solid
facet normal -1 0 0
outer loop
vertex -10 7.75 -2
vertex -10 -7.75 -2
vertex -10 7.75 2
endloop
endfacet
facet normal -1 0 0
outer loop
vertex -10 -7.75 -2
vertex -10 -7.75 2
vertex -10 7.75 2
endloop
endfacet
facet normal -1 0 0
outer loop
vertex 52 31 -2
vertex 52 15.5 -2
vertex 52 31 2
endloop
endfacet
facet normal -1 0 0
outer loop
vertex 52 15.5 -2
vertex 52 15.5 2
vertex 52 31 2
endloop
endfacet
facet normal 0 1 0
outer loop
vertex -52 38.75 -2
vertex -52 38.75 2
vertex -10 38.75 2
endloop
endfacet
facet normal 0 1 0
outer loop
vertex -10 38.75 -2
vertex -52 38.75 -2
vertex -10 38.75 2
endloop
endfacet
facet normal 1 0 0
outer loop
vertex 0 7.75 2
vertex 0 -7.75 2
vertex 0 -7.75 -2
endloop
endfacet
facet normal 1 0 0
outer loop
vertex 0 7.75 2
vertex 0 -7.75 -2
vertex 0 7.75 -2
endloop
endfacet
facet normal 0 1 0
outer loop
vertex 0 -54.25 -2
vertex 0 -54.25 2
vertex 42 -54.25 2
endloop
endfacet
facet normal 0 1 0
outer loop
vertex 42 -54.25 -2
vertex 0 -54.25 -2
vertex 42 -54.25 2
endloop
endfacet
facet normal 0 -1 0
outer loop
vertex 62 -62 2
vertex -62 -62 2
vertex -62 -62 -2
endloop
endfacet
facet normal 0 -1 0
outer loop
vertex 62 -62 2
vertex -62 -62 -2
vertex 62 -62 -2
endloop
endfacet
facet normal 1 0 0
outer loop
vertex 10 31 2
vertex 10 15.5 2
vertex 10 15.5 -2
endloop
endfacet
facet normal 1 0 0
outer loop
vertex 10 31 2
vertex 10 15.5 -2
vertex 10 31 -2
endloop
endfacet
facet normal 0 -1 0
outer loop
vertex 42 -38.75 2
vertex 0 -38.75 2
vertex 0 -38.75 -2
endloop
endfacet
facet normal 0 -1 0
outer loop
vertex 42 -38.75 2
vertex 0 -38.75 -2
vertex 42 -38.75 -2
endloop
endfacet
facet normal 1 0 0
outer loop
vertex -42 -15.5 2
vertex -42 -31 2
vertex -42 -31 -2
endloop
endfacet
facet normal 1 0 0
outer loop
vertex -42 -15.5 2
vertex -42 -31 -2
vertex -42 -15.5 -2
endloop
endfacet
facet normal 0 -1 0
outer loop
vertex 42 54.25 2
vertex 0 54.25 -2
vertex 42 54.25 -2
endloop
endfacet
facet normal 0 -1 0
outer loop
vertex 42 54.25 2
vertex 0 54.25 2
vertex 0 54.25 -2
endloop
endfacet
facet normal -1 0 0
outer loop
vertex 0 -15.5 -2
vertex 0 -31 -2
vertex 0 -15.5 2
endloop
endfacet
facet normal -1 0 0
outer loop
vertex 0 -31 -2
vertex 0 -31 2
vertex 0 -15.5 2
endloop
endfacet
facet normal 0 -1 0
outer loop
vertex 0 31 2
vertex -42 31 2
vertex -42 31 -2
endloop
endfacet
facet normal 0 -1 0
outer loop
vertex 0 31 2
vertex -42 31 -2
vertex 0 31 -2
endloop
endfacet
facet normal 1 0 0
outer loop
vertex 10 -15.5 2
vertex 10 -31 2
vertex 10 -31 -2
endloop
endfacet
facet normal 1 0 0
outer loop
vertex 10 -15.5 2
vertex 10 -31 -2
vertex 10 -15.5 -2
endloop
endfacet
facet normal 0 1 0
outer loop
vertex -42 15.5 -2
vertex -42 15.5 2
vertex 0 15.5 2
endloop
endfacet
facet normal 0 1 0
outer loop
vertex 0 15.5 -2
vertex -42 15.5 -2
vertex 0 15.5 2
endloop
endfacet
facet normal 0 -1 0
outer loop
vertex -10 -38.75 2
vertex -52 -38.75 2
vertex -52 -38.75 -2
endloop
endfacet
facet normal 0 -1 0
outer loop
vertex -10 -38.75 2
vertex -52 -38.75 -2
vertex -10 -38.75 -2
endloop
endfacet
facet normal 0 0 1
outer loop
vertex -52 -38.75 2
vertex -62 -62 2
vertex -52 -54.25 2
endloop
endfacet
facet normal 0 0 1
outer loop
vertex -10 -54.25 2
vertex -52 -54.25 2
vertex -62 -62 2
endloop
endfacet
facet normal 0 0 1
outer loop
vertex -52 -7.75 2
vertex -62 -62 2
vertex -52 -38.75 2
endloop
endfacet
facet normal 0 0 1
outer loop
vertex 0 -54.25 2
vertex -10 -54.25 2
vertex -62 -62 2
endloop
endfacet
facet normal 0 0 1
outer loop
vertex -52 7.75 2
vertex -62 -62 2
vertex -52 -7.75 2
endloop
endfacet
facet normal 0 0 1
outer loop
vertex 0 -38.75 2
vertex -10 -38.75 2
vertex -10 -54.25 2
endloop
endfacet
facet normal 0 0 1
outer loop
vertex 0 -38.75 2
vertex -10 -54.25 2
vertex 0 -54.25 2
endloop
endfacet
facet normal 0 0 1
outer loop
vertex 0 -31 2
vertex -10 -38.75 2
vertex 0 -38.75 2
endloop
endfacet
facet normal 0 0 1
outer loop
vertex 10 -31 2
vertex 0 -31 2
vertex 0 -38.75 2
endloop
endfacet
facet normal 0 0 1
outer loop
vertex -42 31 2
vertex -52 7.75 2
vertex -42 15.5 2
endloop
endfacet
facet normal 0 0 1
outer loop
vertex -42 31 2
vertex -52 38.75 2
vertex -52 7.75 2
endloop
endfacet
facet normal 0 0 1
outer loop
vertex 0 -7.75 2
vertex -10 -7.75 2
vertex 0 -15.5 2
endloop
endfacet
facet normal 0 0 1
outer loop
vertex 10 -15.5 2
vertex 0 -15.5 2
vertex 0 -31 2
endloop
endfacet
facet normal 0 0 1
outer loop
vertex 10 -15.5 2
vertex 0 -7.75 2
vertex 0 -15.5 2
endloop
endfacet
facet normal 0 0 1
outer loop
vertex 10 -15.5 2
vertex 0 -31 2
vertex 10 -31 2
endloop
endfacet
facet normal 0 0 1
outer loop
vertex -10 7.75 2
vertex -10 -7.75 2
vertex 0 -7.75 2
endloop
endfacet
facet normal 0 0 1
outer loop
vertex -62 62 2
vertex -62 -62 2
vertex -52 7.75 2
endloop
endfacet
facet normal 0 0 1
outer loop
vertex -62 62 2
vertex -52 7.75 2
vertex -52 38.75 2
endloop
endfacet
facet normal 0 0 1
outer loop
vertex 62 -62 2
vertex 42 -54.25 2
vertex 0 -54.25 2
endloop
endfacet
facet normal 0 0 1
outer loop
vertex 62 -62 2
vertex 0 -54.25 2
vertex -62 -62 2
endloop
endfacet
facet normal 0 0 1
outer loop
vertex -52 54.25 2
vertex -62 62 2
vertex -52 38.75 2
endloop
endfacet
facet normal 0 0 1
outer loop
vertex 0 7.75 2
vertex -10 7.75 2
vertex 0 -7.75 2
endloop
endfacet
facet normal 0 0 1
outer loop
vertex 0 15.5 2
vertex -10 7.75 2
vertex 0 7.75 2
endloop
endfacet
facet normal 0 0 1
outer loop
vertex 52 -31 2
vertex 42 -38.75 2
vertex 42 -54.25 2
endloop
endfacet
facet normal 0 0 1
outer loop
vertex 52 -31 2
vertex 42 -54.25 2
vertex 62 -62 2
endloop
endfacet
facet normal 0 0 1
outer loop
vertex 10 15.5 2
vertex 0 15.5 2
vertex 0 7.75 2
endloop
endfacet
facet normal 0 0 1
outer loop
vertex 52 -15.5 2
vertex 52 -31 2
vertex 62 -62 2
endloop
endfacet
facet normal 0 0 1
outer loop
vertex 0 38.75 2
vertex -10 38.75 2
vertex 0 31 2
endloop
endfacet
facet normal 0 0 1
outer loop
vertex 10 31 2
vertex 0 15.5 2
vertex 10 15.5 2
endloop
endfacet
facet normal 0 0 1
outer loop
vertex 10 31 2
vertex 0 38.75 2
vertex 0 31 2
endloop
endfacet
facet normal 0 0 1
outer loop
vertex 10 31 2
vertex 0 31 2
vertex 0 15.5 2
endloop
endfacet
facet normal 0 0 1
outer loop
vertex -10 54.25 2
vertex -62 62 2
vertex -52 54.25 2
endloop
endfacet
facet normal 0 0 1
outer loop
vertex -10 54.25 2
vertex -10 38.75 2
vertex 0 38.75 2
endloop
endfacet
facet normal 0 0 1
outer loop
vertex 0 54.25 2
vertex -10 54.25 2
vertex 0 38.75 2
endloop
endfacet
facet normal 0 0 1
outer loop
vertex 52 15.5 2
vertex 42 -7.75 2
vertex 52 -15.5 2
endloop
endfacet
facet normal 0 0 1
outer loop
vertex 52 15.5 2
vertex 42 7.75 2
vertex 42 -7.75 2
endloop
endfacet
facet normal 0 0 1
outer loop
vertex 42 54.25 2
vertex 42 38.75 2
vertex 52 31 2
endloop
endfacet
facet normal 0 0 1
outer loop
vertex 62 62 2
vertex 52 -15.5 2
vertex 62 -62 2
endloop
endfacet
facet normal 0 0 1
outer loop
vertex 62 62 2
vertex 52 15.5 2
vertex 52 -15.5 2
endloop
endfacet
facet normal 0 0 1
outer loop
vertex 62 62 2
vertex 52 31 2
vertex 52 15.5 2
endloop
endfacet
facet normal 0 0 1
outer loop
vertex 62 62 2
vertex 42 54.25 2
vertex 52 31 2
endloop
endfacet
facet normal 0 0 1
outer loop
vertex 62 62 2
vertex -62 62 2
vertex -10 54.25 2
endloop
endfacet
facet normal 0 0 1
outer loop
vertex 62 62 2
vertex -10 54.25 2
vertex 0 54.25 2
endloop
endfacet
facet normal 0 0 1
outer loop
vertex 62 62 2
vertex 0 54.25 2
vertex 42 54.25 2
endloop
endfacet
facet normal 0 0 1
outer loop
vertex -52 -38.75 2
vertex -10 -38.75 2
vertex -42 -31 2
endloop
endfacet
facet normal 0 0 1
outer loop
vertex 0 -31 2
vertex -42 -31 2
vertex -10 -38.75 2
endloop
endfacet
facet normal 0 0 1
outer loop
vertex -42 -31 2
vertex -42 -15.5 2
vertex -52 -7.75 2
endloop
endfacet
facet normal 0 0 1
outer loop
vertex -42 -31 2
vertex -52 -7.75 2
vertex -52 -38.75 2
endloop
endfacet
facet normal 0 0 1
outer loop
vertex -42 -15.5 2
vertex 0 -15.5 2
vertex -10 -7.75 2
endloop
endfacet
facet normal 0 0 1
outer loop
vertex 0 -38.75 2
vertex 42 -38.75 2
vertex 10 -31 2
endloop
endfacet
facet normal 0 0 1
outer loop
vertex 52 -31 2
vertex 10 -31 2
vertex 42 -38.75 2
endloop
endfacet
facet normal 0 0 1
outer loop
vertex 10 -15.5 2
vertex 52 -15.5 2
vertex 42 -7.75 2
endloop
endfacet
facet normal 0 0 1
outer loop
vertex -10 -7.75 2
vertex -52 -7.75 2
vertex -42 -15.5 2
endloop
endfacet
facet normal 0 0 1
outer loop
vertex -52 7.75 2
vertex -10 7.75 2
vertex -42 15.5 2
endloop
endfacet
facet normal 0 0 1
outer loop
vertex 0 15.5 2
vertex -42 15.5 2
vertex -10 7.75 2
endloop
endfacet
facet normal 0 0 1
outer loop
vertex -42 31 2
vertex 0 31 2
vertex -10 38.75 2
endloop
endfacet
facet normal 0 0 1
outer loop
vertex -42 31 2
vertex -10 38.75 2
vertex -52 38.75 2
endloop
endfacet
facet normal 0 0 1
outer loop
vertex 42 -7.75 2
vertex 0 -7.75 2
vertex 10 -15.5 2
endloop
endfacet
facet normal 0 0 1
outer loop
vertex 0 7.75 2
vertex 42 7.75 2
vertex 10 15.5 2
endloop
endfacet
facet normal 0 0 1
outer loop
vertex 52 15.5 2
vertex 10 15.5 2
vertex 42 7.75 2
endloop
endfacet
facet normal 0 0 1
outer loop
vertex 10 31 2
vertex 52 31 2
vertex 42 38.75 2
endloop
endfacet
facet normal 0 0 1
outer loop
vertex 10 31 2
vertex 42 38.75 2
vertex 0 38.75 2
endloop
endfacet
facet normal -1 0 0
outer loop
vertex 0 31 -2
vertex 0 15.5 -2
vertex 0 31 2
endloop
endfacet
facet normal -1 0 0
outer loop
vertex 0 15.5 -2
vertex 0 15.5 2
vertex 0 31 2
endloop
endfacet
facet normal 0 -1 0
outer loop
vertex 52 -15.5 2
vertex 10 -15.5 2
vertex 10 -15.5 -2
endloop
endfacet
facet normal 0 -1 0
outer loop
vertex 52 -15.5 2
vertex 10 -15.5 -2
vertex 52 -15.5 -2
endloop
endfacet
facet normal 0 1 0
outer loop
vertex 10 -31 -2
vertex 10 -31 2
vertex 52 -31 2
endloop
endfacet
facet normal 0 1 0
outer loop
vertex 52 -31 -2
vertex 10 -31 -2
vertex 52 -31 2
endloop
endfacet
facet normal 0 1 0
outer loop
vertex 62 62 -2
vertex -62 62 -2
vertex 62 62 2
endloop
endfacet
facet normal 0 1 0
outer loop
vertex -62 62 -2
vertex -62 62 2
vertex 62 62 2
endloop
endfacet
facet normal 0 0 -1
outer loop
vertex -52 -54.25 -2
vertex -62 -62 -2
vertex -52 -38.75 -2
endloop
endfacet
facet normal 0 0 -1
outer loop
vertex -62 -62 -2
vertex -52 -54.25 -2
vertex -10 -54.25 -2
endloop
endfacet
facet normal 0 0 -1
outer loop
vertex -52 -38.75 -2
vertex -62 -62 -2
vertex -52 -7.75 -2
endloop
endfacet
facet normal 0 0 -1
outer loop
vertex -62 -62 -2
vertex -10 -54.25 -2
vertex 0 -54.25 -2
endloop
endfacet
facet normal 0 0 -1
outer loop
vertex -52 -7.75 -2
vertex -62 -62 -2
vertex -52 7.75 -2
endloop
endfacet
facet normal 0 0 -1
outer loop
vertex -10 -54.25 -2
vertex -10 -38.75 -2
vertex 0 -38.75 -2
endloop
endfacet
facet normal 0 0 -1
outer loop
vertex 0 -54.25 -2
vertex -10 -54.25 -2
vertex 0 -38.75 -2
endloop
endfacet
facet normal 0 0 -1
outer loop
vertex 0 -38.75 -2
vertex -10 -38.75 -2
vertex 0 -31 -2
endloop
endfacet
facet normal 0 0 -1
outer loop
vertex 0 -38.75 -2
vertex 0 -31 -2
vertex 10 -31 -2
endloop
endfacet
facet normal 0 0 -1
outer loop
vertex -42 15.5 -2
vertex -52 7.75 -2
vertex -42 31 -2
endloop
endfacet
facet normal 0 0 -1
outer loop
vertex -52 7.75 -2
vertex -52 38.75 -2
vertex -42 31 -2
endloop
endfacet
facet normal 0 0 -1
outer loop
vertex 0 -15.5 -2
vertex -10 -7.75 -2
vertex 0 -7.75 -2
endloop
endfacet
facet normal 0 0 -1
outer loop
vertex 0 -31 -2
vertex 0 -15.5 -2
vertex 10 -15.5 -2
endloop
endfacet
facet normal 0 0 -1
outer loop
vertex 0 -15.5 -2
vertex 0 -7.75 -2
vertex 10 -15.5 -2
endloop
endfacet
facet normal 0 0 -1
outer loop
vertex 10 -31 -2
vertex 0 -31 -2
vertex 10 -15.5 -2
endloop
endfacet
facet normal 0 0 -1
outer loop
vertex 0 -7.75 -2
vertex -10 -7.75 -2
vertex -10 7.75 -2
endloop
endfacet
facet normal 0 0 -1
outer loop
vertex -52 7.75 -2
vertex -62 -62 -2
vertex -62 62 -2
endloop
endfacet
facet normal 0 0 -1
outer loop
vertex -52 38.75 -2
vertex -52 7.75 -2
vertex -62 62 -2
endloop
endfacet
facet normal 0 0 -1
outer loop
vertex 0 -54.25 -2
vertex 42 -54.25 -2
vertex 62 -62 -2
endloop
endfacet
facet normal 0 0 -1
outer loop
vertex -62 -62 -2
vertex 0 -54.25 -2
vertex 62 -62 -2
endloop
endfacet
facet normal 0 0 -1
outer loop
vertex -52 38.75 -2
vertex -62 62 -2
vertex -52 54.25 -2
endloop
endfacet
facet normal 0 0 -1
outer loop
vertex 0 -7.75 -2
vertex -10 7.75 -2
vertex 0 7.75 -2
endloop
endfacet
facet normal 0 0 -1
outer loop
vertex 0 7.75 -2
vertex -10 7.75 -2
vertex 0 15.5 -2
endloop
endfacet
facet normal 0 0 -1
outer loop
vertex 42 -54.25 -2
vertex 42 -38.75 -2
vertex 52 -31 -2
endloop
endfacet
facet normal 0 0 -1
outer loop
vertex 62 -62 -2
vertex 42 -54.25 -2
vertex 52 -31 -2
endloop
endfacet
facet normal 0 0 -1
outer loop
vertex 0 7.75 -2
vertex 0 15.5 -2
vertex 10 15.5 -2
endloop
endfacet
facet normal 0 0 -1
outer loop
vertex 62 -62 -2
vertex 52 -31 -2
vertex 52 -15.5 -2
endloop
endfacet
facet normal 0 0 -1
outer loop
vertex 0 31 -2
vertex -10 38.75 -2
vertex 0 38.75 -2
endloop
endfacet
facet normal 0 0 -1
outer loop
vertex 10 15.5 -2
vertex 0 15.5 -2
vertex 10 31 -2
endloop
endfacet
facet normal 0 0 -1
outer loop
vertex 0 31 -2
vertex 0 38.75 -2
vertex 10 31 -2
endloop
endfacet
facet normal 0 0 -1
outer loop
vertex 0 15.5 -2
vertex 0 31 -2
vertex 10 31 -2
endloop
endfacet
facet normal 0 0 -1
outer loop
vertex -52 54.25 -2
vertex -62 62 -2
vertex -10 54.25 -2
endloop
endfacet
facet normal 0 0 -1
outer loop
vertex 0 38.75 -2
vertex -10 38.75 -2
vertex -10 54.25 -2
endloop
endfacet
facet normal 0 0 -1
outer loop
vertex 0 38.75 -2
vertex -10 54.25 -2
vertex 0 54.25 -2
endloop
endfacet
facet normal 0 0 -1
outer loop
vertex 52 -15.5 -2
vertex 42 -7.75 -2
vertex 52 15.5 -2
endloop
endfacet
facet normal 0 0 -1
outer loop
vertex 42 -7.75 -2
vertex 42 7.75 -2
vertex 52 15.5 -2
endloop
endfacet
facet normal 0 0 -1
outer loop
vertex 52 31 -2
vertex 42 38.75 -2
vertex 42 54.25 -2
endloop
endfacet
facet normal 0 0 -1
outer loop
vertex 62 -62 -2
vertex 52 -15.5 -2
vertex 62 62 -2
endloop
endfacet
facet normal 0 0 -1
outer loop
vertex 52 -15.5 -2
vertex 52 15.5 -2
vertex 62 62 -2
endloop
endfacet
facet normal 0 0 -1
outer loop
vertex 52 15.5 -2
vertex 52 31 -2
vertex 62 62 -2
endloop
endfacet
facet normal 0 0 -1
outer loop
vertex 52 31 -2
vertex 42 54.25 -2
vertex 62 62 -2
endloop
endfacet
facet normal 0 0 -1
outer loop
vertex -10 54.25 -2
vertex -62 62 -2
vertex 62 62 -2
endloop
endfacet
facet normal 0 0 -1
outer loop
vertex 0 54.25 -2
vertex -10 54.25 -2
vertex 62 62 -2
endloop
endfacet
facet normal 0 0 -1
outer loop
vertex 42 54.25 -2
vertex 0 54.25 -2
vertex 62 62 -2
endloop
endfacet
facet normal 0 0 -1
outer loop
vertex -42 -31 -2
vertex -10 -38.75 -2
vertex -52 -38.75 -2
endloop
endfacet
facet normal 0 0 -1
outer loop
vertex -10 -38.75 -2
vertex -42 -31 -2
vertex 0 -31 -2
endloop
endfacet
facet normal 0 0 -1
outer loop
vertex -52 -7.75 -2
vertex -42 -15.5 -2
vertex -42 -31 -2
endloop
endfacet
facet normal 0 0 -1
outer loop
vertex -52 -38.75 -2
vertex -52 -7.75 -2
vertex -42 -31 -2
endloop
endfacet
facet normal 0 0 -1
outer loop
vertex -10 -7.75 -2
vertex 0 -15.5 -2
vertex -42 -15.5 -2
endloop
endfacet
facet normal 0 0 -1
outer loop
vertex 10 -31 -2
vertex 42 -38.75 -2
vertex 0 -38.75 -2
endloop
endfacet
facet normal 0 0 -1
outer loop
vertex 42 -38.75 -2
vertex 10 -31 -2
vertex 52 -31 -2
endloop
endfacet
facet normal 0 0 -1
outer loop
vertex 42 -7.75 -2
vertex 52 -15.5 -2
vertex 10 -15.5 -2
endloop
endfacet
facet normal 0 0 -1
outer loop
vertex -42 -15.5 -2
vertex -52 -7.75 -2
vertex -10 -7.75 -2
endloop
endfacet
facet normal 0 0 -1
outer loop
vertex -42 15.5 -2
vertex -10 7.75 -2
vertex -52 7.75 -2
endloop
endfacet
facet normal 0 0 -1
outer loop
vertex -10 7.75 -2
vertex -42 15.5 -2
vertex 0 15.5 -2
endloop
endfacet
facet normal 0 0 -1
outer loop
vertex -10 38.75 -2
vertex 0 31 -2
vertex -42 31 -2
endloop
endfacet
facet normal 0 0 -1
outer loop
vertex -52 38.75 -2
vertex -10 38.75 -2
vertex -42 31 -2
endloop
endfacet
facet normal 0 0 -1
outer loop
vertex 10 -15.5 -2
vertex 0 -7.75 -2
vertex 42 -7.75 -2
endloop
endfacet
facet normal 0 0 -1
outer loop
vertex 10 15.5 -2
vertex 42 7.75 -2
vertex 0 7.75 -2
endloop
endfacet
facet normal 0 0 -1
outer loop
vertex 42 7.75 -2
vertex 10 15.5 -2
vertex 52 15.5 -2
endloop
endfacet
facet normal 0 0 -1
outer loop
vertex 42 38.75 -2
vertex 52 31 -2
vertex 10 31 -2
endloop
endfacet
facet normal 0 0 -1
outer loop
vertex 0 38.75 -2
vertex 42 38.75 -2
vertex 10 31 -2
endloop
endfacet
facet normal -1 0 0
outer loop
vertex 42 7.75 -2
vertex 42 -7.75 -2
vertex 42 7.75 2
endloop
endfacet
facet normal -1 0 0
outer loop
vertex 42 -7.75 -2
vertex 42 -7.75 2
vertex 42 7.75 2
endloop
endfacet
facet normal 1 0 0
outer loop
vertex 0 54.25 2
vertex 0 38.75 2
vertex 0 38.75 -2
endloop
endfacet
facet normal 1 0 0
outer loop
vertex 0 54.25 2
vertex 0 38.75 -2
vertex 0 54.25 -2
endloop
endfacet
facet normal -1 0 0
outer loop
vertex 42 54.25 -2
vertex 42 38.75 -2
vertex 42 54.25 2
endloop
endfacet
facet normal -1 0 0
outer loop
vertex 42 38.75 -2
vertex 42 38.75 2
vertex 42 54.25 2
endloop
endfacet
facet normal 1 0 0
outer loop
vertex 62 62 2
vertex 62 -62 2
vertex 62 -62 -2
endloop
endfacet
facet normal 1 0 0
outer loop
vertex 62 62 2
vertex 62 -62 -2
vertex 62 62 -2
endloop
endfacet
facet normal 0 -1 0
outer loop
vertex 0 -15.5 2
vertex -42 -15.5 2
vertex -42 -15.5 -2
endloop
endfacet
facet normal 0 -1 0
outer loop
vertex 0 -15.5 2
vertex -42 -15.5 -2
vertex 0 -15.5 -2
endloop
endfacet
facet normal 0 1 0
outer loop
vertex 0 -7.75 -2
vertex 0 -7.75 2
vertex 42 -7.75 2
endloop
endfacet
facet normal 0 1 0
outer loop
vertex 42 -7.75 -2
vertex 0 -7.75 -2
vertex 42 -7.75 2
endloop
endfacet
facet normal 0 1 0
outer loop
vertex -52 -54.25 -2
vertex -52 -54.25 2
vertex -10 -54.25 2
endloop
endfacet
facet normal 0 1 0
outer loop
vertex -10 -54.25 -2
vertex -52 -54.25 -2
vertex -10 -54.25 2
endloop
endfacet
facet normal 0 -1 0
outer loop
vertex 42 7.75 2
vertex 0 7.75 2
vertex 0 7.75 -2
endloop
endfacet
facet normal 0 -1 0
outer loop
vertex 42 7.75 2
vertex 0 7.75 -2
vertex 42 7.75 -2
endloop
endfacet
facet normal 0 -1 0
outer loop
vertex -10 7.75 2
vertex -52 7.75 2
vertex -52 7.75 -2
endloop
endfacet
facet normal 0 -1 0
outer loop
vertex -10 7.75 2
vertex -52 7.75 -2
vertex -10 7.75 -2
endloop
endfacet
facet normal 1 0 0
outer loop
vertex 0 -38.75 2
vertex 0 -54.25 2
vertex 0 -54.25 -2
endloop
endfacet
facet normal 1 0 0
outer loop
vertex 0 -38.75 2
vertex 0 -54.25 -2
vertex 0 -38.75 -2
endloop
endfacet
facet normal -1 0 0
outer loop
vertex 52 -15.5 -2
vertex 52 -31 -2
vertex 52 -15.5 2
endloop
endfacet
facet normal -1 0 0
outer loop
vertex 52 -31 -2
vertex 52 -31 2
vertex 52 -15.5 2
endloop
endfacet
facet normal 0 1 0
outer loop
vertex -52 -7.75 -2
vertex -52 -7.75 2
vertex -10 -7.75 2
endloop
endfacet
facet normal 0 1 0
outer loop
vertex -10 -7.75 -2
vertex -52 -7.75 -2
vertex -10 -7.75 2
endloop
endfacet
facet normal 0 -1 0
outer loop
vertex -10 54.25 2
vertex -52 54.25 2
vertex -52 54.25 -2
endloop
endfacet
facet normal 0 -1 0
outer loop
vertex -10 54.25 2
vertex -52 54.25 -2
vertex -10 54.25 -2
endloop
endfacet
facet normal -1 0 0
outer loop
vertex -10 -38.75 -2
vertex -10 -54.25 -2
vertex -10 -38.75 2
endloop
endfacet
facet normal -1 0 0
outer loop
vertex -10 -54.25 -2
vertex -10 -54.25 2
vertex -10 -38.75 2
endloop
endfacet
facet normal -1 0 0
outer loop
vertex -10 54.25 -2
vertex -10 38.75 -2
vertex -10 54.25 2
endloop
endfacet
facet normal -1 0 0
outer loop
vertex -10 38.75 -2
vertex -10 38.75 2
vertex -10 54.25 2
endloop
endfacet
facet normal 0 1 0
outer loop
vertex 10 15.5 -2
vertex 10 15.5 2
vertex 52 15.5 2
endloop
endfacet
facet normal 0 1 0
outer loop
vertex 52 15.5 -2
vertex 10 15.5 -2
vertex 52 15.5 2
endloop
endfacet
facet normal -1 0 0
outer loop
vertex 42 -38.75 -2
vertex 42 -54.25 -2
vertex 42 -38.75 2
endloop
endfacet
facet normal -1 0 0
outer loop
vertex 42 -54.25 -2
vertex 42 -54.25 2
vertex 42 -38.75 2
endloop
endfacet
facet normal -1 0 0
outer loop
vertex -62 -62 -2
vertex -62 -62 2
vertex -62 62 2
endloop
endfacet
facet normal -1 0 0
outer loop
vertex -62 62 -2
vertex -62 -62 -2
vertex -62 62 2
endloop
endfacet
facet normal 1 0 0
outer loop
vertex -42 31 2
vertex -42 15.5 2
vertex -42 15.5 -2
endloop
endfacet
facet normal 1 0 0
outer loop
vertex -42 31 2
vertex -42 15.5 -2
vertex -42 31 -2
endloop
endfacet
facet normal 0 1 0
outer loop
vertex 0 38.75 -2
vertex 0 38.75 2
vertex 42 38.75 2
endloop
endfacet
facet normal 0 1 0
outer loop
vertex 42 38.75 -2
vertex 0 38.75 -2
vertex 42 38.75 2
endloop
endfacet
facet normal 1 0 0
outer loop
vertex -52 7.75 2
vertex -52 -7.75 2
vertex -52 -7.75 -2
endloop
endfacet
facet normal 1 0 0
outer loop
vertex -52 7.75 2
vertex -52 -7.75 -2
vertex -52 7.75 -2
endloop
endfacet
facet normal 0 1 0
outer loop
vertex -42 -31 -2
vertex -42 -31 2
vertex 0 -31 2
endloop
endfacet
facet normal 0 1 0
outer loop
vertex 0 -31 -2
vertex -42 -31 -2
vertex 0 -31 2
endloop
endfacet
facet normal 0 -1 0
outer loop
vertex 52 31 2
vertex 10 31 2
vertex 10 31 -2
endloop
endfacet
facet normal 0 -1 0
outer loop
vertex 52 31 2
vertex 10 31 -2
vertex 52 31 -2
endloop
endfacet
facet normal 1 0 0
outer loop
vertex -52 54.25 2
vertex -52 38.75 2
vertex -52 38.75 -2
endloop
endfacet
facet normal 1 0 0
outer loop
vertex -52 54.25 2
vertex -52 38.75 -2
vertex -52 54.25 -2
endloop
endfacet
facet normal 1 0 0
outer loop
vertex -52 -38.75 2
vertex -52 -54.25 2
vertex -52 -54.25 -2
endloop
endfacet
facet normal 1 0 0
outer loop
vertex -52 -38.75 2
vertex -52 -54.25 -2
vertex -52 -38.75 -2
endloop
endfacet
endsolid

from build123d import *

# Parameters (mm, degrees)
F0_W     = 124
F0_H     = 124
F0_W_2   = 42
F0_H_2   = 15.5
F1_DEPTH = 2


with BuildPart() as f1:
    # F0 (on Top) → F1 (new body, symmetric)
    with BuildSketch(Plane.XY):
        Rectangle(F0_W, F0_H)
        with Locations((-31, -46.5)):
            Rectangle(F0_W_2, F0_H_2, mode=Mode.SUBTRACT)
        with Locations((-21, -23.25)):
            Rectangle(F0_W_2, F0_H_2, mode=Mode.SUBTRACT)
        with Locations((21, -46.5)):
            Rectangle(F0_W_2, F0_H_2, mode=Mode.SUBTRACT)
        with Locations((31, -23.25)):
            Rectangle(F0_W_2, F0_H_2, mode=Mode.SUBTRACT)
        with Locations((-31, 0)):
            Rectangle(F0_W_2, F0_H_2, mode=Mode.SUBTRACT)
        with Locations((-21, 23.25)):
            Rectangle(F0_W_2, F0_H_2, mode=Mode.SUBTRACT)
        with Locations((-31, 46.5)):
            Rectangle(F0_W_2, F0_H_2, mode=Mode.SUBTRACT)
        with Locations((21, 0)):
            Rectangle(F0_W_2, F0_H_2, mode=Mode.SUBTRACT)
        with Locations((31, 23.25)):
            Rectangle(F0_W_2, F0_H_2, mode=Mode.SUBTRACT)
        with Locations((21, 46.5)):
            Rectangle(F0_W_2, F0_H_2, mode=Mode.SUBTRACT)
    extrude(amount=F1_DEPTH, both=True)


solid = f1.part
